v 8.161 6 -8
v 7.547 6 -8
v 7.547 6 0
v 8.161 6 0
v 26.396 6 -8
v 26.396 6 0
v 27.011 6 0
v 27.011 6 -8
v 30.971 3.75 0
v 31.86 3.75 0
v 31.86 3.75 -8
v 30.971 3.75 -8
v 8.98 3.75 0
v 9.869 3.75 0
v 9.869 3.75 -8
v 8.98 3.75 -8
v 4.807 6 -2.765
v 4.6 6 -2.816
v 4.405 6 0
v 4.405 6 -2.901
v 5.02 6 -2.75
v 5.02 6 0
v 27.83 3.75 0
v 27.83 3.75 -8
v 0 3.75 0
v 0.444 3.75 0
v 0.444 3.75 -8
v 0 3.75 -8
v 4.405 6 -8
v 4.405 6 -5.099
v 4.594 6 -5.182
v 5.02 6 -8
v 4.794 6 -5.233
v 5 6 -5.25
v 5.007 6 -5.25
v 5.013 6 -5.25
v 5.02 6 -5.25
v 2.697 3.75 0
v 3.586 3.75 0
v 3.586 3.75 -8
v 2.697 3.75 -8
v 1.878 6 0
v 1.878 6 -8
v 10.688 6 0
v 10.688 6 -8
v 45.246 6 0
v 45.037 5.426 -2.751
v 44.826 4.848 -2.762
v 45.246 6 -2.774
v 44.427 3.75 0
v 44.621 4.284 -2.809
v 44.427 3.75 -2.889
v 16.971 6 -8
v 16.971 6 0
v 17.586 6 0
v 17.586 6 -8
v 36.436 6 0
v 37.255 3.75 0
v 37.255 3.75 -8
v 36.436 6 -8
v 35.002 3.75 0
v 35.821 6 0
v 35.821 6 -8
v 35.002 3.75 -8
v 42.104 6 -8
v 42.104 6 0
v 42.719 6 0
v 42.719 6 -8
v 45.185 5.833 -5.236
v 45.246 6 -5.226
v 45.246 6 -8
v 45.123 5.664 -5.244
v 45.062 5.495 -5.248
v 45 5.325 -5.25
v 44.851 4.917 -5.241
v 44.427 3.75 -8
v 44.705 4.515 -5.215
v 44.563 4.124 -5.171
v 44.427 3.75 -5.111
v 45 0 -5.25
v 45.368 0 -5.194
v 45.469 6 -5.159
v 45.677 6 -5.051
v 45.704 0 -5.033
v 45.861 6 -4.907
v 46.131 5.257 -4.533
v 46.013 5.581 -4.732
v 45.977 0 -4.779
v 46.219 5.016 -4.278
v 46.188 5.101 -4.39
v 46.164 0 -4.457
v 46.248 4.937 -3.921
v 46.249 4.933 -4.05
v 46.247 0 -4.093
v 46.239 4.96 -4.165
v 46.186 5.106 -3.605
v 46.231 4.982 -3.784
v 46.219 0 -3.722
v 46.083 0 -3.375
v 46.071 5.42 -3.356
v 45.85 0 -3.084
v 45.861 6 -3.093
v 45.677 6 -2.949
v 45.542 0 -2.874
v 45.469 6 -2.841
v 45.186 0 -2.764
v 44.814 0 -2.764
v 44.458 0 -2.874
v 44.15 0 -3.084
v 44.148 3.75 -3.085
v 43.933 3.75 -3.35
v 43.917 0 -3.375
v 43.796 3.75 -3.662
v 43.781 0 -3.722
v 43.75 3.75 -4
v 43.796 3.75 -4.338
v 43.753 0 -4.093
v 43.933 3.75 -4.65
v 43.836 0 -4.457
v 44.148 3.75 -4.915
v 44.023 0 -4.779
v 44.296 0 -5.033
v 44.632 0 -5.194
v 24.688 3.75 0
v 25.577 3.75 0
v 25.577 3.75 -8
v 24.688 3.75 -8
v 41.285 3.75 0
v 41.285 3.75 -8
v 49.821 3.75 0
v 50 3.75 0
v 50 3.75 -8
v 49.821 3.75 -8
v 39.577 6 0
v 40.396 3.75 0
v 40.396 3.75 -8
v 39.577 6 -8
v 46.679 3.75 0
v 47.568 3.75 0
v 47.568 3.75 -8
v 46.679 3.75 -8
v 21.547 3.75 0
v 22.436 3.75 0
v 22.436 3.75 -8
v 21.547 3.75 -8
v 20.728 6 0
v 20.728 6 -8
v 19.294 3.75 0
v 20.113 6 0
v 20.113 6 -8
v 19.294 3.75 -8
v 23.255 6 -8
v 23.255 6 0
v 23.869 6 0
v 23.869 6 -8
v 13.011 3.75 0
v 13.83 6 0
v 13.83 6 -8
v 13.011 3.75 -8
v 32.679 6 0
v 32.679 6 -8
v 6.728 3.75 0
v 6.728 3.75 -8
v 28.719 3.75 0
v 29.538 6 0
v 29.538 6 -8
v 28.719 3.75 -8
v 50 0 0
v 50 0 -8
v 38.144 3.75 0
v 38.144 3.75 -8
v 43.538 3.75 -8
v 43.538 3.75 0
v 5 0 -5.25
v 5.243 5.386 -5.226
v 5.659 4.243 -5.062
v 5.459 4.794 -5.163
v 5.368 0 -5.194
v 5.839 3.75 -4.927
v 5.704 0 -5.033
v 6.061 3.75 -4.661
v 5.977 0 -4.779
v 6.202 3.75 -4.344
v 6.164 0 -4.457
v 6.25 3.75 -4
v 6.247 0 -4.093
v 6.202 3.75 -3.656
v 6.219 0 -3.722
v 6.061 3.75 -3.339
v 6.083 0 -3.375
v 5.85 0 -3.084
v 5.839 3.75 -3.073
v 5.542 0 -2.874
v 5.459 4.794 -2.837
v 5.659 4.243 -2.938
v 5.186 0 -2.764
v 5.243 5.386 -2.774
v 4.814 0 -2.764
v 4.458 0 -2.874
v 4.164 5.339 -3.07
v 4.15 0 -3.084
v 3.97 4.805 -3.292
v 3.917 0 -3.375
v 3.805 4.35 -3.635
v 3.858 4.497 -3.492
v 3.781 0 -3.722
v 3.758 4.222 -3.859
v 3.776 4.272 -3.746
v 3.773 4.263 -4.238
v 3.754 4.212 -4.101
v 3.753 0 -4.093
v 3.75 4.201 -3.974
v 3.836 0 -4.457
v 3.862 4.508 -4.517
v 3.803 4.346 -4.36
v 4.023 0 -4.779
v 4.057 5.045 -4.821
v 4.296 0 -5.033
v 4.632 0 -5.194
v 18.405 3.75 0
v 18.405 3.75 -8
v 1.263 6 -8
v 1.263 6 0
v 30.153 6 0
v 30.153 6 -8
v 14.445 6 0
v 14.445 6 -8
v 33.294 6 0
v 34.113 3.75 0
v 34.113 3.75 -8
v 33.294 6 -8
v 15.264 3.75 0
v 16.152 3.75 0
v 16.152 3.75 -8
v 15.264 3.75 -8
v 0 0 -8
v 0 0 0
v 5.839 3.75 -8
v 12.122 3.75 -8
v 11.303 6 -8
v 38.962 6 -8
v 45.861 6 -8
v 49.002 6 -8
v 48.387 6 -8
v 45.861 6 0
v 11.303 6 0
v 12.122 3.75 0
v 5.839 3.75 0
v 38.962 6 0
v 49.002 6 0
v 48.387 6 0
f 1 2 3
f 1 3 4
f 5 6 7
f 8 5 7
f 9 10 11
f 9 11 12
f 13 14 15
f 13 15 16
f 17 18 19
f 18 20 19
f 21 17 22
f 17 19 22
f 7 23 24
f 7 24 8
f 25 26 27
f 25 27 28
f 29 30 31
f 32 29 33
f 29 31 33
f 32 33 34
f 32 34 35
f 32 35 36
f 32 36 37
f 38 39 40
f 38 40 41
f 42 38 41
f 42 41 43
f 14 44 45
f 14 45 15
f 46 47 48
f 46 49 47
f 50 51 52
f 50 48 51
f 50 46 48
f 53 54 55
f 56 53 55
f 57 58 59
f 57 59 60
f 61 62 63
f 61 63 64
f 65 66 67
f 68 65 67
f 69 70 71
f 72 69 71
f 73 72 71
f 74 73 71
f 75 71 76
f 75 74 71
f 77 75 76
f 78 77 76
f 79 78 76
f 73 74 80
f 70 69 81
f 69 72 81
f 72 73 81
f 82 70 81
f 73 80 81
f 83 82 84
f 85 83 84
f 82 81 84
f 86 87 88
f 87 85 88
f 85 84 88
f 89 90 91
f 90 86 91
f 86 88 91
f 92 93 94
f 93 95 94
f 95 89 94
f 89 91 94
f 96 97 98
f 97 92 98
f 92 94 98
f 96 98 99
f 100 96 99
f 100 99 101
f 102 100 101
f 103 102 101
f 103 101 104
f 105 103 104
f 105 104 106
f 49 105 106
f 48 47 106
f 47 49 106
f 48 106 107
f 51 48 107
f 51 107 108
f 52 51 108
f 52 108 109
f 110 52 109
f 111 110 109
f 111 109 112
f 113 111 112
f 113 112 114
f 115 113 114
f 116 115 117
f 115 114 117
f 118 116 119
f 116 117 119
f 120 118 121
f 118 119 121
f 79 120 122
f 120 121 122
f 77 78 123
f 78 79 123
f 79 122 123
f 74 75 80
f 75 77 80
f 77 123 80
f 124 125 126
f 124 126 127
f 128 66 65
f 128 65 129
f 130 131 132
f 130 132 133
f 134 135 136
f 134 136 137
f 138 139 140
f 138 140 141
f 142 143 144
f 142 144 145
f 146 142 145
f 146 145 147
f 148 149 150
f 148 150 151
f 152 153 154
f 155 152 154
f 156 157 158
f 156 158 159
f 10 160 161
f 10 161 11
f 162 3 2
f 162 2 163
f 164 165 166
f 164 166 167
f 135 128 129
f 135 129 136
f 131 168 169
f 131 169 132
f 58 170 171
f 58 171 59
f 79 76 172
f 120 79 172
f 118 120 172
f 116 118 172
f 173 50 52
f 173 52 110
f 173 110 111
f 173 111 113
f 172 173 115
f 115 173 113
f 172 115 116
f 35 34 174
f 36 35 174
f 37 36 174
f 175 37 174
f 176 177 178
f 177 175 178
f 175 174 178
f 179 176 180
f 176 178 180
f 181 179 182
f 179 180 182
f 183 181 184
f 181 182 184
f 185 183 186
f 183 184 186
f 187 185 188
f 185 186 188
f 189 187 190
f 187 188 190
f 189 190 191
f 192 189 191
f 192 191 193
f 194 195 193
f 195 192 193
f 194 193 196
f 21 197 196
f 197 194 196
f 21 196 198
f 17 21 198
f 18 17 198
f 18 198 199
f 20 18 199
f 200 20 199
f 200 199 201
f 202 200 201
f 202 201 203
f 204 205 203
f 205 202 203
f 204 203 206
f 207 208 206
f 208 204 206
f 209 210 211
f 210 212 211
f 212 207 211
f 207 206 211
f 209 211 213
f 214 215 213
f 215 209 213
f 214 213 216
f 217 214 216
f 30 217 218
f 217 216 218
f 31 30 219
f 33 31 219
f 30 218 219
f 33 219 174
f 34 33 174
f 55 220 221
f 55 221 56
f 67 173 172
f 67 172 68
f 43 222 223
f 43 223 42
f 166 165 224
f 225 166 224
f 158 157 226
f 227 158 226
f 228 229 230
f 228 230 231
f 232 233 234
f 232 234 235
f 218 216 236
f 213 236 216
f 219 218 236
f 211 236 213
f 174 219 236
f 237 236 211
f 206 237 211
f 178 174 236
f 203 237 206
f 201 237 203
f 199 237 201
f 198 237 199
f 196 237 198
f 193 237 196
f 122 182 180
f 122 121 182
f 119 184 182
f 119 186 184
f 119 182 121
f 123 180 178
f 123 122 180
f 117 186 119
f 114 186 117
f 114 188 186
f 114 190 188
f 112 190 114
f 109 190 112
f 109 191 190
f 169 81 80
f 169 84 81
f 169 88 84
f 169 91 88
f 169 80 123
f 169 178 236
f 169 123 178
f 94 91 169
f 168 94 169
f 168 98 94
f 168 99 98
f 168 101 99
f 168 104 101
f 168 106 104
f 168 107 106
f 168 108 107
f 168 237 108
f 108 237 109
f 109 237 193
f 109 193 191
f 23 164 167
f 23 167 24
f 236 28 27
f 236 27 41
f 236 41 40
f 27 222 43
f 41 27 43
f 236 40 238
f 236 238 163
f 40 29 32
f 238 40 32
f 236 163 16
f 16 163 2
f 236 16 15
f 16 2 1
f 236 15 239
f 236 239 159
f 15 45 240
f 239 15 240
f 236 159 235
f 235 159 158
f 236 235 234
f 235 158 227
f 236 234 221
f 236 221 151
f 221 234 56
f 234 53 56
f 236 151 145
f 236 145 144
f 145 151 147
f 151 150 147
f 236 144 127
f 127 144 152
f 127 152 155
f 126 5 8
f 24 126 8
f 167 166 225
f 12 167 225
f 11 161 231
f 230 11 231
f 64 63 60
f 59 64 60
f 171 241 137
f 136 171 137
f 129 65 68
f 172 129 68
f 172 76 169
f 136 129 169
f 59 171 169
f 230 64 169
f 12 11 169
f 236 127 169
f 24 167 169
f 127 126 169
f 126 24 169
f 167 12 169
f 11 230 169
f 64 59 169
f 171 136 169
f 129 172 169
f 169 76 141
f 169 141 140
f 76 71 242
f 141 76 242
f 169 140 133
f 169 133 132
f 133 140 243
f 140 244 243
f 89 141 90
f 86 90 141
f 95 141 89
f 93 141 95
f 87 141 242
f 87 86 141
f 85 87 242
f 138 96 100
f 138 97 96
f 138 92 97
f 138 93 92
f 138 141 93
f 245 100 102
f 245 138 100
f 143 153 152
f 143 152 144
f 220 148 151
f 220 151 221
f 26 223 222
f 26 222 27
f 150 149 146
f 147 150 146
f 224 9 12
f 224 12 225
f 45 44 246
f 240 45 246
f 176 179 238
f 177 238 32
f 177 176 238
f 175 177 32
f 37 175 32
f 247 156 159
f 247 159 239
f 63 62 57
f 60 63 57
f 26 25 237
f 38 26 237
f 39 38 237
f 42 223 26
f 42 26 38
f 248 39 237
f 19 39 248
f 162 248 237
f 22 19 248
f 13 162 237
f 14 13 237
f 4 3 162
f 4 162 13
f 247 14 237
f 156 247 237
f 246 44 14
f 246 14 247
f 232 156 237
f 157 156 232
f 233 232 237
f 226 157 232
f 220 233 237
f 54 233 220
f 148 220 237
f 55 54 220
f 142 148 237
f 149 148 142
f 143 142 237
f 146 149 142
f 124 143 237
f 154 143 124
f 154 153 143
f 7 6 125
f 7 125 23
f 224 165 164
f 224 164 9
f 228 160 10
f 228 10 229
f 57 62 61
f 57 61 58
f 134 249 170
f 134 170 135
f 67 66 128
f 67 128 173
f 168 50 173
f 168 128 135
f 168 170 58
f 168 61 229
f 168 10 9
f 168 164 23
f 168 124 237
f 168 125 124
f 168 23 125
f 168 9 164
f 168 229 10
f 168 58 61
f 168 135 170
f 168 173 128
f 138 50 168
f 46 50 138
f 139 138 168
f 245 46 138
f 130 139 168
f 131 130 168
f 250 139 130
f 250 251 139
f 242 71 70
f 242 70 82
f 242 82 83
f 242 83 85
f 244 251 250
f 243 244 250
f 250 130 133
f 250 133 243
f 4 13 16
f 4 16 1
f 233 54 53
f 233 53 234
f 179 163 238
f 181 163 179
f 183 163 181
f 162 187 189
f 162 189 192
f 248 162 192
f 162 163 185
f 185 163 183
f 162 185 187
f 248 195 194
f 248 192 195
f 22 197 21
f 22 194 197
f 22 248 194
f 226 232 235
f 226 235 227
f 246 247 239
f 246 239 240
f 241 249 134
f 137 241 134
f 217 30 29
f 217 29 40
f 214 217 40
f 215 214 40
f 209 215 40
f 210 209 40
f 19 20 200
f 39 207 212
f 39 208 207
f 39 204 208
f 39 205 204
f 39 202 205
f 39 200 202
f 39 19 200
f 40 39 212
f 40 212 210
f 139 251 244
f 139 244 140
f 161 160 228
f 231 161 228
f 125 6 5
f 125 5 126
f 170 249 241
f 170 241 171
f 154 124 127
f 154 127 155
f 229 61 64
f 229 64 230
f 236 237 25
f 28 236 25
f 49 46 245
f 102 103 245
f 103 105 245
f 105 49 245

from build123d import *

# Parameters (mm, degrees)
BLANKSKE_W         = 50
BLANKSKE_H         = 6
BLANK_DEPTH        = 8
TOOTHCUTSIM_DEPTH  = 51.990195136
TEETHCUTS_COUNT    = 17
TEETHCUTS_PITCH    = 3.14159265
SKETCH1_R          = 1.25
CUT_EXTRUDE1_DEPTH = 10


with BuildPart() as part:
    # BlankSke → Blank (new body)
    with BuildSketch(Plane.XY):
        with Locations((25, 3)):
            Rectangle(BLANKSKE_W, BLANKSKE_H)
    extrude(amount=-BLANK_DEPTH)

    # TooCutSkeSim → ToothCutSim (cut, through all)
    with BuildSketch(Plane.XY):
        Polygon((0.44443537, 3.75), (-0.44443537, 3.75), (-1.272613241, 6.0254), (1.272613241, 6.0254), align=None)
    toothcutsim = extrude(amount=-TOOTHCUTSIM_DEPTH, mode=Mode.SUBTRACT)

    # TeethCuts: ToothCutSim ×17
    with Locations(*[(i * TEETHCUTS_PITCH, 0, 0) for i in range(1, TEETHCUTS_COUNT)]):
        add(toothcutsim, mode=Mode.SUBTRACT)

    # Sketch1 → Cut-Extrude1 (cut)
    with BuildSketch(Plane(origin=(0, 0, 0), x_dir=(-1, 0, 0), z_dir=(0, -1, 0))):
        with Locations(Location((-45, 4, 0), (0, 0, 90))):
            Circle(SKETCH1_R)
        with Locations(Location((-5, 4, 0), (0, 0, 90))):
            Circle(SKETCH1_R)
    extrude(amount=-CUT_EXTRUDE1_DEPTH, mode=Mode.SUBTRACT)


solid = part.part
